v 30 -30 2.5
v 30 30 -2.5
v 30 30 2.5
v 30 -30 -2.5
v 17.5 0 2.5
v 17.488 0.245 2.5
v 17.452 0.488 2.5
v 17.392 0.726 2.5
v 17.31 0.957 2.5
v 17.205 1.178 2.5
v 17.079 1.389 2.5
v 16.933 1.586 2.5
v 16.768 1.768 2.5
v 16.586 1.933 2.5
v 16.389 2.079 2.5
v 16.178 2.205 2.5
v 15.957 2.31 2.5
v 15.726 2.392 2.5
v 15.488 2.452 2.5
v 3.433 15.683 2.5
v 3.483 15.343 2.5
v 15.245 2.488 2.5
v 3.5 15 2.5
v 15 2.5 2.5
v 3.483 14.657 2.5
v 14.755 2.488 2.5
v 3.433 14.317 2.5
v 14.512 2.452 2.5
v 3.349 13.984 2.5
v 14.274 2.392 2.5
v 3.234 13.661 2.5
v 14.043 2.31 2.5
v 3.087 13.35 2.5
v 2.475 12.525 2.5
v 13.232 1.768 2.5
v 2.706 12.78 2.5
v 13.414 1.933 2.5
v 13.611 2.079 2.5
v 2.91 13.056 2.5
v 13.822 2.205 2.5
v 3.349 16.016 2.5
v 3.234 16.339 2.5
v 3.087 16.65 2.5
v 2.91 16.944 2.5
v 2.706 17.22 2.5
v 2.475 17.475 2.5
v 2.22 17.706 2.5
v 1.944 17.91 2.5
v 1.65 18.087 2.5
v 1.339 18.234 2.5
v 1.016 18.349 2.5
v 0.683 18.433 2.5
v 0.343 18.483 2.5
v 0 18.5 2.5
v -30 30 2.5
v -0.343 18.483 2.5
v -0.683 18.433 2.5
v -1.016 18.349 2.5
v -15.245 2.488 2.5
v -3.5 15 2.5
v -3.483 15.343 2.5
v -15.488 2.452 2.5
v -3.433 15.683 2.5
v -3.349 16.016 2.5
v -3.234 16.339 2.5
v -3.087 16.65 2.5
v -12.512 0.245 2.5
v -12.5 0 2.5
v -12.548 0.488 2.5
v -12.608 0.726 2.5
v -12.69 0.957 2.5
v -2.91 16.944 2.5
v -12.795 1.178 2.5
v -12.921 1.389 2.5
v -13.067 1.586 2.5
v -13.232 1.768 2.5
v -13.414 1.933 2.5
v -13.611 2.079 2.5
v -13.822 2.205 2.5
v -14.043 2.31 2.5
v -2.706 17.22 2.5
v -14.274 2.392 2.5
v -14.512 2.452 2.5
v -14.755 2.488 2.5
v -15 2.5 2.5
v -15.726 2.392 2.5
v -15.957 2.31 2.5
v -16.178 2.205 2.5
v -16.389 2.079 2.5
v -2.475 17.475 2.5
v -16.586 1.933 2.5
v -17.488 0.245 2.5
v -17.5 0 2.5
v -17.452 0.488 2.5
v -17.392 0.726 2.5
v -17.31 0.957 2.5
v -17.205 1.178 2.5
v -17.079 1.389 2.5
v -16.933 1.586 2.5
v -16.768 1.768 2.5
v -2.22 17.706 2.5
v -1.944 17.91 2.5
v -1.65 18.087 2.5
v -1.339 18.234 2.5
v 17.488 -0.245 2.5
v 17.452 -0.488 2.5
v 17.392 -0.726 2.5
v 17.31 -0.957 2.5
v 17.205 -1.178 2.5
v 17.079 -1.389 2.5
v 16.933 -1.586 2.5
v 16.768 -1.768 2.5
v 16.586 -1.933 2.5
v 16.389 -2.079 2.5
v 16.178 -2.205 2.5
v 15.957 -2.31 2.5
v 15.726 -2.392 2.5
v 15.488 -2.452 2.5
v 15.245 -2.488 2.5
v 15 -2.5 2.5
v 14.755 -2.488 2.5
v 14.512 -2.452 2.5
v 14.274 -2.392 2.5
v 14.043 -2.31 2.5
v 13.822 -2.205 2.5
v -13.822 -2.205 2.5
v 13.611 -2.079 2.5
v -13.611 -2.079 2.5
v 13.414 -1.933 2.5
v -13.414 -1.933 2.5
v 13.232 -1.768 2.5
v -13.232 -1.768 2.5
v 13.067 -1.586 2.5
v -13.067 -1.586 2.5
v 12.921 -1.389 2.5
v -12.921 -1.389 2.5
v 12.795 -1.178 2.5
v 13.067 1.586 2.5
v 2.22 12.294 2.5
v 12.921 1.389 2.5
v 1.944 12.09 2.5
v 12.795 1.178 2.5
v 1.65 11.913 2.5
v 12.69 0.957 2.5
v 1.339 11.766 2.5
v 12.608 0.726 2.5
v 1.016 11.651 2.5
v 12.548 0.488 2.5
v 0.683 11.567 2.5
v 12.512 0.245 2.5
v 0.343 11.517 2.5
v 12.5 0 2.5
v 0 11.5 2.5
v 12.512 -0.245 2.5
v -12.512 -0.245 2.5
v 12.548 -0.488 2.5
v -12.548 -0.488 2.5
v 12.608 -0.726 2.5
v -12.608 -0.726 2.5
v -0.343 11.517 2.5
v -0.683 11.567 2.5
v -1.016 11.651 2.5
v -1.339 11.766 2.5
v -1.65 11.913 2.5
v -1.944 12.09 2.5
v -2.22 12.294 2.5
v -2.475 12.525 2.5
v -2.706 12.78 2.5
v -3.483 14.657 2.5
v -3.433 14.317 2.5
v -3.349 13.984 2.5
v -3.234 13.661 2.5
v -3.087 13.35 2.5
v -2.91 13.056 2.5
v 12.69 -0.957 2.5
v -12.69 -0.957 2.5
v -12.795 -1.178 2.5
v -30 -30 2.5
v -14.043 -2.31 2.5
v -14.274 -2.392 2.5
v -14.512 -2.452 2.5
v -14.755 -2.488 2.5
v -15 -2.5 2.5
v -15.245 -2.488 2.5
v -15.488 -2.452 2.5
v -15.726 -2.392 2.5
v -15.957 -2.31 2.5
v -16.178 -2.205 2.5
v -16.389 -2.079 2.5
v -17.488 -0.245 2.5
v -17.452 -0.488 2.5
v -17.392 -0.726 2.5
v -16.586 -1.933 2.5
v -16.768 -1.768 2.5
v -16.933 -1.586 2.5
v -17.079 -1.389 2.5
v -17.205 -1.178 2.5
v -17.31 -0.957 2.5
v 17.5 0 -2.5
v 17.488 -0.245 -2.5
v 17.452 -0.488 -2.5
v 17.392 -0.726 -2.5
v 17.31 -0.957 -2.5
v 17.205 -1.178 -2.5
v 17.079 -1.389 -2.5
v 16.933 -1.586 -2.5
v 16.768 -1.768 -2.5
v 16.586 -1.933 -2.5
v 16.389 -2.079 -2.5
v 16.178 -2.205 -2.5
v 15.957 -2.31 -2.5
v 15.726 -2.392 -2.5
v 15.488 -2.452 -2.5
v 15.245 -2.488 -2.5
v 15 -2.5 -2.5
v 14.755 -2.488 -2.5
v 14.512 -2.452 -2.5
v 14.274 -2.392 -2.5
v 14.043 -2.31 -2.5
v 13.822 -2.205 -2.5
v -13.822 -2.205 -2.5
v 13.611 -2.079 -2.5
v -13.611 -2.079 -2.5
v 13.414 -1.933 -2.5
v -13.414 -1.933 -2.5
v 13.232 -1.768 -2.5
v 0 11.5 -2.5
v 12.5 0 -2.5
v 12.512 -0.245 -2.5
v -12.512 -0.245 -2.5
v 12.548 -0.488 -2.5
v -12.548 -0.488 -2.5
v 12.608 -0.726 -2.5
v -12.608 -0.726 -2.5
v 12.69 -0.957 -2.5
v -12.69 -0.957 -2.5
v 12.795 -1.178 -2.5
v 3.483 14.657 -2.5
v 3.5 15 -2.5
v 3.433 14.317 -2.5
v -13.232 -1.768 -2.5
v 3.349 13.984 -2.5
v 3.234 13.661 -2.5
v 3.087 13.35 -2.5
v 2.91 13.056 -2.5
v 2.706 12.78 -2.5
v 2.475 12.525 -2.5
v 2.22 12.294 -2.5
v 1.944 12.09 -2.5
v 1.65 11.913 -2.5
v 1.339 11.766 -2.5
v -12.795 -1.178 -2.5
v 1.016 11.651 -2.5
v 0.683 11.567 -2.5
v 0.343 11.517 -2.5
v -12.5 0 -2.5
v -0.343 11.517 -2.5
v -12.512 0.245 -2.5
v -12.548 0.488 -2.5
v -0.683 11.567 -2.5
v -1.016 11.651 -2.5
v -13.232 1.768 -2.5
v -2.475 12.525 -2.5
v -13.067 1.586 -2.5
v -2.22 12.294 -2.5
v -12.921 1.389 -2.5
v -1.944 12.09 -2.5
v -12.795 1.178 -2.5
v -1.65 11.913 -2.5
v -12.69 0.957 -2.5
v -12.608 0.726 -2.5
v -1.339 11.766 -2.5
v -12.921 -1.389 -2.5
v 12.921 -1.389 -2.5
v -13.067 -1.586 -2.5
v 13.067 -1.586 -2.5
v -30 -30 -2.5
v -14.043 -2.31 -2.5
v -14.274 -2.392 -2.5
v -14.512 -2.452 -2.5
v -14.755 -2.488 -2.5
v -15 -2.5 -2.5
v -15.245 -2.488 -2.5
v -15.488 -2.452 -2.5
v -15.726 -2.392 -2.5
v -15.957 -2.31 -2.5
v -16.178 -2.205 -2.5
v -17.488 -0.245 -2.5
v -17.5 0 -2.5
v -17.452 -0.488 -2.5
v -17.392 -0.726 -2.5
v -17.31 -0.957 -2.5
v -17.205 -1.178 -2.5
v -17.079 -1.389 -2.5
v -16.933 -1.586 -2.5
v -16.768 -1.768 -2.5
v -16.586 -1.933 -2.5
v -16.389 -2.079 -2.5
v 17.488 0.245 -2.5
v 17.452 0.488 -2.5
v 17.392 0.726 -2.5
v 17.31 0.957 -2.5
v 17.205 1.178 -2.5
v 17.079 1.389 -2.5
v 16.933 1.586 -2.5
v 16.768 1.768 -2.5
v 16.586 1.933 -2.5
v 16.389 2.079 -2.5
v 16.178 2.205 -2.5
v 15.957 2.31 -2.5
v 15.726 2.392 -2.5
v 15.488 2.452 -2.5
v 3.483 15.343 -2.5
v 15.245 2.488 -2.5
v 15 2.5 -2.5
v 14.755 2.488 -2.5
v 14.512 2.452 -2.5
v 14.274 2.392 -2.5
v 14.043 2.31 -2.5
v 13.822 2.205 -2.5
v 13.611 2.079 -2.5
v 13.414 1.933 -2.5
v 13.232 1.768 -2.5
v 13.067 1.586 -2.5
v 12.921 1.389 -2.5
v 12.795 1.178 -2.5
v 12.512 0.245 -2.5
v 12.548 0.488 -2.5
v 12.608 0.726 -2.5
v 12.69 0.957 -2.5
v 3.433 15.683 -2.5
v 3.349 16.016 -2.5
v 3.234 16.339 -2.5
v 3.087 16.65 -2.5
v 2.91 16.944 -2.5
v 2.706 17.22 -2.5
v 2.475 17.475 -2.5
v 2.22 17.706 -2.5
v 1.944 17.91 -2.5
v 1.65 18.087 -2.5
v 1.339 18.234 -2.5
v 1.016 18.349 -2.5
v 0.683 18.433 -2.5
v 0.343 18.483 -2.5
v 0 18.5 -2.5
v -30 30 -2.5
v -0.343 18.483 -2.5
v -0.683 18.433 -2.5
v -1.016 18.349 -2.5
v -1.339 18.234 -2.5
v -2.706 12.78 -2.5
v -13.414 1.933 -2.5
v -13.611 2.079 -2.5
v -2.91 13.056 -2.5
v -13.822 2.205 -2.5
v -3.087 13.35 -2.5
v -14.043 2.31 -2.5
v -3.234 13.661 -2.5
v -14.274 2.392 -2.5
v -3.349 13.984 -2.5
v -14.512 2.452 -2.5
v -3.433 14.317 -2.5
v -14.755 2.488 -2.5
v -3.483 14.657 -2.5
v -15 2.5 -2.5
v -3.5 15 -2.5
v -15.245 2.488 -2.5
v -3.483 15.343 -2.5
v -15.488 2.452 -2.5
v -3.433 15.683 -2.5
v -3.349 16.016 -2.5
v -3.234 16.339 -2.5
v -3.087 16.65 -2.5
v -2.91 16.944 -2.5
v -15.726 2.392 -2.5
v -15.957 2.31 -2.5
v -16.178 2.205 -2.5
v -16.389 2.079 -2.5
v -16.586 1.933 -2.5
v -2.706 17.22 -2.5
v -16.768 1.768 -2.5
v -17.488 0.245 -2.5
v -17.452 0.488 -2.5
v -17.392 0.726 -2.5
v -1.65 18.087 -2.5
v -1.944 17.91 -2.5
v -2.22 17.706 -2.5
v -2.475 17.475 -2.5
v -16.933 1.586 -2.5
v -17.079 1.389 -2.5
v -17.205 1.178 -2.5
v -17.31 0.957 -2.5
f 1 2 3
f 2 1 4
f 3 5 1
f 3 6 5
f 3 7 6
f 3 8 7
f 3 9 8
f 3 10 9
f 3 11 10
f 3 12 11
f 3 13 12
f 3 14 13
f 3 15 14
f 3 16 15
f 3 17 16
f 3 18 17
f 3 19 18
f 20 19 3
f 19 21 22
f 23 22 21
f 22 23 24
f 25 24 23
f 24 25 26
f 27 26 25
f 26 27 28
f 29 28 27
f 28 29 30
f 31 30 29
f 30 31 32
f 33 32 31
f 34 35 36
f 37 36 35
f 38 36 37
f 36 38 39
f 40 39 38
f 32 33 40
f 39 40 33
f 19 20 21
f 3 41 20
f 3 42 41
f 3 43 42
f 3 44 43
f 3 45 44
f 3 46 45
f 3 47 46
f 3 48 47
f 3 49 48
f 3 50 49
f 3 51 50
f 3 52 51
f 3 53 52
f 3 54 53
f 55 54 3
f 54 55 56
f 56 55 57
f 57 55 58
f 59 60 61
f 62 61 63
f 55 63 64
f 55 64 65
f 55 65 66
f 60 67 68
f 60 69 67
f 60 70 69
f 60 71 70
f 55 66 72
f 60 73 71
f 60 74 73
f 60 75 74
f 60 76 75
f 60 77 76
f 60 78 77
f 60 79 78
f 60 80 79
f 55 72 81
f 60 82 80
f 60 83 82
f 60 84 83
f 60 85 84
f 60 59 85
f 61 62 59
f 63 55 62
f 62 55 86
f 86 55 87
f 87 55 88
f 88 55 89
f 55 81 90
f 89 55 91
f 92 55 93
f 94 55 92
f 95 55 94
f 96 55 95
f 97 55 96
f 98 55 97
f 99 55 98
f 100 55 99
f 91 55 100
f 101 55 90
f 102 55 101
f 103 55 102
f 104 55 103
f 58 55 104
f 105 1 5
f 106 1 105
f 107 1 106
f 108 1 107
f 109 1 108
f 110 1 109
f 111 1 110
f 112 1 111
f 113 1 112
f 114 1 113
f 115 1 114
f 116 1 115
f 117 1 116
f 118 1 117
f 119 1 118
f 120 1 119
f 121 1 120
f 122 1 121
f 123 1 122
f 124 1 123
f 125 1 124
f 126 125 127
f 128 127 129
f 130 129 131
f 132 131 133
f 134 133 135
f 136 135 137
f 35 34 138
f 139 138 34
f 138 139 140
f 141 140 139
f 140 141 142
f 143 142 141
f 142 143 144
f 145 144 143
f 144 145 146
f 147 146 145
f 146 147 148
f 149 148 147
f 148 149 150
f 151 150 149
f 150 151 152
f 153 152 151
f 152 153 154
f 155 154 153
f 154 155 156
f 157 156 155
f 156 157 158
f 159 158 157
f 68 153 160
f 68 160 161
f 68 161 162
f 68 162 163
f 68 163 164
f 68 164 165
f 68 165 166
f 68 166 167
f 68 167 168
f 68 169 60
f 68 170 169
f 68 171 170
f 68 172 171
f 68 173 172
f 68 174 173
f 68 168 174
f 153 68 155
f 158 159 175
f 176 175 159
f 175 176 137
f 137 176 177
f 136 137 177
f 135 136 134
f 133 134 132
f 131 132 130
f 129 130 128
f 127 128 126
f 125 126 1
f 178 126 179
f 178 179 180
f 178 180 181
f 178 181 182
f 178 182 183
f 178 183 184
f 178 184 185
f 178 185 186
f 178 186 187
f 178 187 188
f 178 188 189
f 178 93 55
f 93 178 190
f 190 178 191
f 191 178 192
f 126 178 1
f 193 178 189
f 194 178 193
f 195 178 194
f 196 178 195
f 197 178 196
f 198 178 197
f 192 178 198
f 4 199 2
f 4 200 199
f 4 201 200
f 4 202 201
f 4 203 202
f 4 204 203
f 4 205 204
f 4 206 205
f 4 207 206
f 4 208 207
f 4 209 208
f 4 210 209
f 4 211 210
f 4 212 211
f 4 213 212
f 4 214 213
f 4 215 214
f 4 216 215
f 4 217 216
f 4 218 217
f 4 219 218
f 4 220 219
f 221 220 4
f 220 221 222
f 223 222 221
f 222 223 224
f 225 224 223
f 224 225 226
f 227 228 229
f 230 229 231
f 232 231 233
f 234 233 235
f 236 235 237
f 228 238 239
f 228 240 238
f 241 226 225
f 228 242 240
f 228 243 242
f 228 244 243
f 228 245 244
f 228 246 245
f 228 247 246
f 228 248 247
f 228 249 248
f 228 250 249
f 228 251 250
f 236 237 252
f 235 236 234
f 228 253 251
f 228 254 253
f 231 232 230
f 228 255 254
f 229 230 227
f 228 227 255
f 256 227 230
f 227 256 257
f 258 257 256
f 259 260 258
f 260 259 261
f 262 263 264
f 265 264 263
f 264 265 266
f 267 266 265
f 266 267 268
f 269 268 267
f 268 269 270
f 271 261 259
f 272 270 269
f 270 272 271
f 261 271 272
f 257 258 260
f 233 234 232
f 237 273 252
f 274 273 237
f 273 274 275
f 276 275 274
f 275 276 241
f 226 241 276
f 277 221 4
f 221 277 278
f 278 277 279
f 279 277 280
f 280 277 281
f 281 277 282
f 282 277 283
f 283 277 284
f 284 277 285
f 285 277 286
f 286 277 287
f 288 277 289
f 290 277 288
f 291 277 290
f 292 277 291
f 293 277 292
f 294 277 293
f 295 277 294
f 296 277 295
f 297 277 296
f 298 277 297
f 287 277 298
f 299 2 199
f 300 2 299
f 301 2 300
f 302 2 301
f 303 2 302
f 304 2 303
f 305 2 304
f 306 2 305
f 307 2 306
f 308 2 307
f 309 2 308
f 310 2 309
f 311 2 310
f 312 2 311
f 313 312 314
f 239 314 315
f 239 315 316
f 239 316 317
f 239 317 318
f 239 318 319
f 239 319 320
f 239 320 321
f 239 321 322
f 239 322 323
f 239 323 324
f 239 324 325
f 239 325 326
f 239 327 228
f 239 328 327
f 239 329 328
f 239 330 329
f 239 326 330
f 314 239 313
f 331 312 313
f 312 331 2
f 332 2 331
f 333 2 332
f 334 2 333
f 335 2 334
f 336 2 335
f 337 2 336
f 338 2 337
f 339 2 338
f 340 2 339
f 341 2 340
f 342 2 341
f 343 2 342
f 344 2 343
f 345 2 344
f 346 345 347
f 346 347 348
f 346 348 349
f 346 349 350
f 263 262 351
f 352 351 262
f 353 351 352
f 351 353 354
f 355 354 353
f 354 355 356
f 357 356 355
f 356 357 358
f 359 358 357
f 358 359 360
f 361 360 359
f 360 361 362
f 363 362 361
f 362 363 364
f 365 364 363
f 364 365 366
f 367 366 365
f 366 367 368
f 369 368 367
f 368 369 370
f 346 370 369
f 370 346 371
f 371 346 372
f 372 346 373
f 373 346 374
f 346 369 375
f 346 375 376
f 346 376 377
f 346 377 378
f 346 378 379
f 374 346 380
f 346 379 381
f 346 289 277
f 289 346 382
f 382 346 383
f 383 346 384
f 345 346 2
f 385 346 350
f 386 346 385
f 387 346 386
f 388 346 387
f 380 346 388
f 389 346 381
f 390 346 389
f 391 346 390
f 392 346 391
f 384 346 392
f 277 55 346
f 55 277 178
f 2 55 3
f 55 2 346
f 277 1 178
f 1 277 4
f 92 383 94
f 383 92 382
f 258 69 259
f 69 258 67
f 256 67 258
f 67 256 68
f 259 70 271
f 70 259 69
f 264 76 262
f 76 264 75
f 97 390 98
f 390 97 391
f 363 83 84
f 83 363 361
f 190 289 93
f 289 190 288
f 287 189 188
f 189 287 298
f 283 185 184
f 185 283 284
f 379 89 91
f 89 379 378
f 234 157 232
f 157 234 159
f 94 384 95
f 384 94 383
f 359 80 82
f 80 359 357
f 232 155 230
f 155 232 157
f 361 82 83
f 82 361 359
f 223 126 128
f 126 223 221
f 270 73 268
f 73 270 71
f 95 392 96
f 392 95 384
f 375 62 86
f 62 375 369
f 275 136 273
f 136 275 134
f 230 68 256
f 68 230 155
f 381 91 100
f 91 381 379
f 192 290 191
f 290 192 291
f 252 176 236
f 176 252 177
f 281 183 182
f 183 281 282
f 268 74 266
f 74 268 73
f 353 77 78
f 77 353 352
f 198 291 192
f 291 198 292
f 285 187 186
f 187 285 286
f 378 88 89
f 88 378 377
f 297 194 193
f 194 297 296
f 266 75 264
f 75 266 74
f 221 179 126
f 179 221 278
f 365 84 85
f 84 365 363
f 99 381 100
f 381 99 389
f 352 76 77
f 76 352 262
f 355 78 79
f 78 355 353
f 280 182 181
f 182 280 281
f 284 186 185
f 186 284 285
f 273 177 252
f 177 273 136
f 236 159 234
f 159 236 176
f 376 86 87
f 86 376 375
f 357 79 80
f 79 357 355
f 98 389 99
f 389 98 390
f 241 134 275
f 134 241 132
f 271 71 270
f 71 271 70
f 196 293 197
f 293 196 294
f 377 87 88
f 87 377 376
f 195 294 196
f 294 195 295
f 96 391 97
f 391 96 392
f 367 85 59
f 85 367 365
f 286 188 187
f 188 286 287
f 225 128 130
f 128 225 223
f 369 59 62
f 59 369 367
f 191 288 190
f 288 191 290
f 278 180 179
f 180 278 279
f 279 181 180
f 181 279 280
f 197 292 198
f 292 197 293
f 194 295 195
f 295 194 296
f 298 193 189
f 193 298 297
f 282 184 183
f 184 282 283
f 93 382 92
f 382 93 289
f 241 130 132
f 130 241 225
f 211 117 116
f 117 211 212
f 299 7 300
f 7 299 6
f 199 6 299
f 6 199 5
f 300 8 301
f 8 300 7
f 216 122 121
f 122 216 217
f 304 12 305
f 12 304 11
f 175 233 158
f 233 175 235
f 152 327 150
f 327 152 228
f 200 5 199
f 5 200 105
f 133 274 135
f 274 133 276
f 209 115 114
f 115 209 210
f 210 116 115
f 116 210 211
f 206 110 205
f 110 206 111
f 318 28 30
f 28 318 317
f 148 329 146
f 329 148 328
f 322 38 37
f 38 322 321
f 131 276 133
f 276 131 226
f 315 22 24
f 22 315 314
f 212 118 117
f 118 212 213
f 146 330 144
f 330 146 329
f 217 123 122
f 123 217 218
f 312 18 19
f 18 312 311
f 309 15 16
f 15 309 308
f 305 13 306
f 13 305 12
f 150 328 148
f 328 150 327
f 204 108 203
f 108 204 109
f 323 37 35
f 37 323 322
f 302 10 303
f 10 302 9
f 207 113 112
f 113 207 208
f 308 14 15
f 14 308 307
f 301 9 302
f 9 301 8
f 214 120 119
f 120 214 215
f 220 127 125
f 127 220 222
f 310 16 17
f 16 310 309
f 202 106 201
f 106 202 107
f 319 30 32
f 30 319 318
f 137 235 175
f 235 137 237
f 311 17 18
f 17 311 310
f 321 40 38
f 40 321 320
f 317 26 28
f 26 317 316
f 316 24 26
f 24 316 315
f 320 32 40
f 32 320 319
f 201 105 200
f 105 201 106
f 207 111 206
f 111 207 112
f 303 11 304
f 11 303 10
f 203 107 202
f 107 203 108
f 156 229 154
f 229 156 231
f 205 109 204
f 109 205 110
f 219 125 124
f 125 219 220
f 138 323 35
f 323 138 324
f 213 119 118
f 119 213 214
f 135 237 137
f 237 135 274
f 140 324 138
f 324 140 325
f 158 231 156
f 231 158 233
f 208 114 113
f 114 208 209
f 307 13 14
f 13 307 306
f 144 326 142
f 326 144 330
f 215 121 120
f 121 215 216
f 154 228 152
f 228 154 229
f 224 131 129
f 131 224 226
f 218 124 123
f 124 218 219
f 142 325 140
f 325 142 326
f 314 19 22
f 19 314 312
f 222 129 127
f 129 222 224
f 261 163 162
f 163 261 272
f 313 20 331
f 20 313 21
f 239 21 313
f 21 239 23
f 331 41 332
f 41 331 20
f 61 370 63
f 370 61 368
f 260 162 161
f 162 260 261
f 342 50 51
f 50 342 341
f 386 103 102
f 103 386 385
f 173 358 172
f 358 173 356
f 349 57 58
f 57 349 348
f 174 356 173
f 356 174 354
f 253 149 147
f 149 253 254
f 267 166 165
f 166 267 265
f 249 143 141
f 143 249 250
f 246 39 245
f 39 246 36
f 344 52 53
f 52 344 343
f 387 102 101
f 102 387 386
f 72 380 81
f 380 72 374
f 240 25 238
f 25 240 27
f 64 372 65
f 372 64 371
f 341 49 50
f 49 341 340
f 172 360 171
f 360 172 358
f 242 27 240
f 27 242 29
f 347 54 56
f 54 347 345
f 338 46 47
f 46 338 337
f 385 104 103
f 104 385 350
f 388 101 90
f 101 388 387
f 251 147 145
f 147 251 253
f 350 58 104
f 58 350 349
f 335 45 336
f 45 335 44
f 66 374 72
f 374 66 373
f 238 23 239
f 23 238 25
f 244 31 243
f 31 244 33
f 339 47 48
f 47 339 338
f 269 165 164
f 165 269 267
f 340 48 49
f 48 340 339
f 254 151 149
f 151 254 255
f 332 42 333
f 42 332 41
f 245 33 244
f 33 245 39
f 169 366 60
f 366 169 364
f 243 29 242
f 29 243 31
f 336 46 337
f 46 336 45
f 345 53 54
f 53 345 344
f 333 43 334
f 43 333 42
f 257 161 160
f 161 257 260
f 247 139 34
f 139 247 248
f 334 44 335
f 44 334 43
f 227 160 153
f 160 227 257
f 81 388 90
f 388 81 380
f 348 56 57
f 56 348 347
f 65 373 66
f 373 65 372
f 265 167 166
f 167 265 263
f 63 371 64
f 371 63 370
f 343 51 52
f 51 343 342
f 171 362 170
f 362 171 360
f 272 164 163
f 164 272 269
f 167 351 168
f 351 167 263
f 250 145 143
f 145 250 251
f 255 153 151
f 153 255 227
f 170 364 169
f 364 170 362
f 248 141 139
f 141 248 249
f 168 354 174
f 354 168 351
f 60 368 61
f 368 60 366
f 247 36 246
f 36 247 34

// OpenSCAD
module mains_socket() {
    difference() {
        // Base plate
        cube([60, 60, 5], center = true);
        
        // Cutouts for the socket holes
        translate([-15, 0, -2.5])
            cylinder(h = 10, d = 5, $fn = 64);
        translate([15, 0, -2.5])
            cylinder(h = 10, d = 5, $fn = 64);
        
        // Cutout for the earth pin
        translate([0, 15, -2.5])
            cylinder(h = 10, d = 7, $fn = 64);
    }
}

mains_socket();
